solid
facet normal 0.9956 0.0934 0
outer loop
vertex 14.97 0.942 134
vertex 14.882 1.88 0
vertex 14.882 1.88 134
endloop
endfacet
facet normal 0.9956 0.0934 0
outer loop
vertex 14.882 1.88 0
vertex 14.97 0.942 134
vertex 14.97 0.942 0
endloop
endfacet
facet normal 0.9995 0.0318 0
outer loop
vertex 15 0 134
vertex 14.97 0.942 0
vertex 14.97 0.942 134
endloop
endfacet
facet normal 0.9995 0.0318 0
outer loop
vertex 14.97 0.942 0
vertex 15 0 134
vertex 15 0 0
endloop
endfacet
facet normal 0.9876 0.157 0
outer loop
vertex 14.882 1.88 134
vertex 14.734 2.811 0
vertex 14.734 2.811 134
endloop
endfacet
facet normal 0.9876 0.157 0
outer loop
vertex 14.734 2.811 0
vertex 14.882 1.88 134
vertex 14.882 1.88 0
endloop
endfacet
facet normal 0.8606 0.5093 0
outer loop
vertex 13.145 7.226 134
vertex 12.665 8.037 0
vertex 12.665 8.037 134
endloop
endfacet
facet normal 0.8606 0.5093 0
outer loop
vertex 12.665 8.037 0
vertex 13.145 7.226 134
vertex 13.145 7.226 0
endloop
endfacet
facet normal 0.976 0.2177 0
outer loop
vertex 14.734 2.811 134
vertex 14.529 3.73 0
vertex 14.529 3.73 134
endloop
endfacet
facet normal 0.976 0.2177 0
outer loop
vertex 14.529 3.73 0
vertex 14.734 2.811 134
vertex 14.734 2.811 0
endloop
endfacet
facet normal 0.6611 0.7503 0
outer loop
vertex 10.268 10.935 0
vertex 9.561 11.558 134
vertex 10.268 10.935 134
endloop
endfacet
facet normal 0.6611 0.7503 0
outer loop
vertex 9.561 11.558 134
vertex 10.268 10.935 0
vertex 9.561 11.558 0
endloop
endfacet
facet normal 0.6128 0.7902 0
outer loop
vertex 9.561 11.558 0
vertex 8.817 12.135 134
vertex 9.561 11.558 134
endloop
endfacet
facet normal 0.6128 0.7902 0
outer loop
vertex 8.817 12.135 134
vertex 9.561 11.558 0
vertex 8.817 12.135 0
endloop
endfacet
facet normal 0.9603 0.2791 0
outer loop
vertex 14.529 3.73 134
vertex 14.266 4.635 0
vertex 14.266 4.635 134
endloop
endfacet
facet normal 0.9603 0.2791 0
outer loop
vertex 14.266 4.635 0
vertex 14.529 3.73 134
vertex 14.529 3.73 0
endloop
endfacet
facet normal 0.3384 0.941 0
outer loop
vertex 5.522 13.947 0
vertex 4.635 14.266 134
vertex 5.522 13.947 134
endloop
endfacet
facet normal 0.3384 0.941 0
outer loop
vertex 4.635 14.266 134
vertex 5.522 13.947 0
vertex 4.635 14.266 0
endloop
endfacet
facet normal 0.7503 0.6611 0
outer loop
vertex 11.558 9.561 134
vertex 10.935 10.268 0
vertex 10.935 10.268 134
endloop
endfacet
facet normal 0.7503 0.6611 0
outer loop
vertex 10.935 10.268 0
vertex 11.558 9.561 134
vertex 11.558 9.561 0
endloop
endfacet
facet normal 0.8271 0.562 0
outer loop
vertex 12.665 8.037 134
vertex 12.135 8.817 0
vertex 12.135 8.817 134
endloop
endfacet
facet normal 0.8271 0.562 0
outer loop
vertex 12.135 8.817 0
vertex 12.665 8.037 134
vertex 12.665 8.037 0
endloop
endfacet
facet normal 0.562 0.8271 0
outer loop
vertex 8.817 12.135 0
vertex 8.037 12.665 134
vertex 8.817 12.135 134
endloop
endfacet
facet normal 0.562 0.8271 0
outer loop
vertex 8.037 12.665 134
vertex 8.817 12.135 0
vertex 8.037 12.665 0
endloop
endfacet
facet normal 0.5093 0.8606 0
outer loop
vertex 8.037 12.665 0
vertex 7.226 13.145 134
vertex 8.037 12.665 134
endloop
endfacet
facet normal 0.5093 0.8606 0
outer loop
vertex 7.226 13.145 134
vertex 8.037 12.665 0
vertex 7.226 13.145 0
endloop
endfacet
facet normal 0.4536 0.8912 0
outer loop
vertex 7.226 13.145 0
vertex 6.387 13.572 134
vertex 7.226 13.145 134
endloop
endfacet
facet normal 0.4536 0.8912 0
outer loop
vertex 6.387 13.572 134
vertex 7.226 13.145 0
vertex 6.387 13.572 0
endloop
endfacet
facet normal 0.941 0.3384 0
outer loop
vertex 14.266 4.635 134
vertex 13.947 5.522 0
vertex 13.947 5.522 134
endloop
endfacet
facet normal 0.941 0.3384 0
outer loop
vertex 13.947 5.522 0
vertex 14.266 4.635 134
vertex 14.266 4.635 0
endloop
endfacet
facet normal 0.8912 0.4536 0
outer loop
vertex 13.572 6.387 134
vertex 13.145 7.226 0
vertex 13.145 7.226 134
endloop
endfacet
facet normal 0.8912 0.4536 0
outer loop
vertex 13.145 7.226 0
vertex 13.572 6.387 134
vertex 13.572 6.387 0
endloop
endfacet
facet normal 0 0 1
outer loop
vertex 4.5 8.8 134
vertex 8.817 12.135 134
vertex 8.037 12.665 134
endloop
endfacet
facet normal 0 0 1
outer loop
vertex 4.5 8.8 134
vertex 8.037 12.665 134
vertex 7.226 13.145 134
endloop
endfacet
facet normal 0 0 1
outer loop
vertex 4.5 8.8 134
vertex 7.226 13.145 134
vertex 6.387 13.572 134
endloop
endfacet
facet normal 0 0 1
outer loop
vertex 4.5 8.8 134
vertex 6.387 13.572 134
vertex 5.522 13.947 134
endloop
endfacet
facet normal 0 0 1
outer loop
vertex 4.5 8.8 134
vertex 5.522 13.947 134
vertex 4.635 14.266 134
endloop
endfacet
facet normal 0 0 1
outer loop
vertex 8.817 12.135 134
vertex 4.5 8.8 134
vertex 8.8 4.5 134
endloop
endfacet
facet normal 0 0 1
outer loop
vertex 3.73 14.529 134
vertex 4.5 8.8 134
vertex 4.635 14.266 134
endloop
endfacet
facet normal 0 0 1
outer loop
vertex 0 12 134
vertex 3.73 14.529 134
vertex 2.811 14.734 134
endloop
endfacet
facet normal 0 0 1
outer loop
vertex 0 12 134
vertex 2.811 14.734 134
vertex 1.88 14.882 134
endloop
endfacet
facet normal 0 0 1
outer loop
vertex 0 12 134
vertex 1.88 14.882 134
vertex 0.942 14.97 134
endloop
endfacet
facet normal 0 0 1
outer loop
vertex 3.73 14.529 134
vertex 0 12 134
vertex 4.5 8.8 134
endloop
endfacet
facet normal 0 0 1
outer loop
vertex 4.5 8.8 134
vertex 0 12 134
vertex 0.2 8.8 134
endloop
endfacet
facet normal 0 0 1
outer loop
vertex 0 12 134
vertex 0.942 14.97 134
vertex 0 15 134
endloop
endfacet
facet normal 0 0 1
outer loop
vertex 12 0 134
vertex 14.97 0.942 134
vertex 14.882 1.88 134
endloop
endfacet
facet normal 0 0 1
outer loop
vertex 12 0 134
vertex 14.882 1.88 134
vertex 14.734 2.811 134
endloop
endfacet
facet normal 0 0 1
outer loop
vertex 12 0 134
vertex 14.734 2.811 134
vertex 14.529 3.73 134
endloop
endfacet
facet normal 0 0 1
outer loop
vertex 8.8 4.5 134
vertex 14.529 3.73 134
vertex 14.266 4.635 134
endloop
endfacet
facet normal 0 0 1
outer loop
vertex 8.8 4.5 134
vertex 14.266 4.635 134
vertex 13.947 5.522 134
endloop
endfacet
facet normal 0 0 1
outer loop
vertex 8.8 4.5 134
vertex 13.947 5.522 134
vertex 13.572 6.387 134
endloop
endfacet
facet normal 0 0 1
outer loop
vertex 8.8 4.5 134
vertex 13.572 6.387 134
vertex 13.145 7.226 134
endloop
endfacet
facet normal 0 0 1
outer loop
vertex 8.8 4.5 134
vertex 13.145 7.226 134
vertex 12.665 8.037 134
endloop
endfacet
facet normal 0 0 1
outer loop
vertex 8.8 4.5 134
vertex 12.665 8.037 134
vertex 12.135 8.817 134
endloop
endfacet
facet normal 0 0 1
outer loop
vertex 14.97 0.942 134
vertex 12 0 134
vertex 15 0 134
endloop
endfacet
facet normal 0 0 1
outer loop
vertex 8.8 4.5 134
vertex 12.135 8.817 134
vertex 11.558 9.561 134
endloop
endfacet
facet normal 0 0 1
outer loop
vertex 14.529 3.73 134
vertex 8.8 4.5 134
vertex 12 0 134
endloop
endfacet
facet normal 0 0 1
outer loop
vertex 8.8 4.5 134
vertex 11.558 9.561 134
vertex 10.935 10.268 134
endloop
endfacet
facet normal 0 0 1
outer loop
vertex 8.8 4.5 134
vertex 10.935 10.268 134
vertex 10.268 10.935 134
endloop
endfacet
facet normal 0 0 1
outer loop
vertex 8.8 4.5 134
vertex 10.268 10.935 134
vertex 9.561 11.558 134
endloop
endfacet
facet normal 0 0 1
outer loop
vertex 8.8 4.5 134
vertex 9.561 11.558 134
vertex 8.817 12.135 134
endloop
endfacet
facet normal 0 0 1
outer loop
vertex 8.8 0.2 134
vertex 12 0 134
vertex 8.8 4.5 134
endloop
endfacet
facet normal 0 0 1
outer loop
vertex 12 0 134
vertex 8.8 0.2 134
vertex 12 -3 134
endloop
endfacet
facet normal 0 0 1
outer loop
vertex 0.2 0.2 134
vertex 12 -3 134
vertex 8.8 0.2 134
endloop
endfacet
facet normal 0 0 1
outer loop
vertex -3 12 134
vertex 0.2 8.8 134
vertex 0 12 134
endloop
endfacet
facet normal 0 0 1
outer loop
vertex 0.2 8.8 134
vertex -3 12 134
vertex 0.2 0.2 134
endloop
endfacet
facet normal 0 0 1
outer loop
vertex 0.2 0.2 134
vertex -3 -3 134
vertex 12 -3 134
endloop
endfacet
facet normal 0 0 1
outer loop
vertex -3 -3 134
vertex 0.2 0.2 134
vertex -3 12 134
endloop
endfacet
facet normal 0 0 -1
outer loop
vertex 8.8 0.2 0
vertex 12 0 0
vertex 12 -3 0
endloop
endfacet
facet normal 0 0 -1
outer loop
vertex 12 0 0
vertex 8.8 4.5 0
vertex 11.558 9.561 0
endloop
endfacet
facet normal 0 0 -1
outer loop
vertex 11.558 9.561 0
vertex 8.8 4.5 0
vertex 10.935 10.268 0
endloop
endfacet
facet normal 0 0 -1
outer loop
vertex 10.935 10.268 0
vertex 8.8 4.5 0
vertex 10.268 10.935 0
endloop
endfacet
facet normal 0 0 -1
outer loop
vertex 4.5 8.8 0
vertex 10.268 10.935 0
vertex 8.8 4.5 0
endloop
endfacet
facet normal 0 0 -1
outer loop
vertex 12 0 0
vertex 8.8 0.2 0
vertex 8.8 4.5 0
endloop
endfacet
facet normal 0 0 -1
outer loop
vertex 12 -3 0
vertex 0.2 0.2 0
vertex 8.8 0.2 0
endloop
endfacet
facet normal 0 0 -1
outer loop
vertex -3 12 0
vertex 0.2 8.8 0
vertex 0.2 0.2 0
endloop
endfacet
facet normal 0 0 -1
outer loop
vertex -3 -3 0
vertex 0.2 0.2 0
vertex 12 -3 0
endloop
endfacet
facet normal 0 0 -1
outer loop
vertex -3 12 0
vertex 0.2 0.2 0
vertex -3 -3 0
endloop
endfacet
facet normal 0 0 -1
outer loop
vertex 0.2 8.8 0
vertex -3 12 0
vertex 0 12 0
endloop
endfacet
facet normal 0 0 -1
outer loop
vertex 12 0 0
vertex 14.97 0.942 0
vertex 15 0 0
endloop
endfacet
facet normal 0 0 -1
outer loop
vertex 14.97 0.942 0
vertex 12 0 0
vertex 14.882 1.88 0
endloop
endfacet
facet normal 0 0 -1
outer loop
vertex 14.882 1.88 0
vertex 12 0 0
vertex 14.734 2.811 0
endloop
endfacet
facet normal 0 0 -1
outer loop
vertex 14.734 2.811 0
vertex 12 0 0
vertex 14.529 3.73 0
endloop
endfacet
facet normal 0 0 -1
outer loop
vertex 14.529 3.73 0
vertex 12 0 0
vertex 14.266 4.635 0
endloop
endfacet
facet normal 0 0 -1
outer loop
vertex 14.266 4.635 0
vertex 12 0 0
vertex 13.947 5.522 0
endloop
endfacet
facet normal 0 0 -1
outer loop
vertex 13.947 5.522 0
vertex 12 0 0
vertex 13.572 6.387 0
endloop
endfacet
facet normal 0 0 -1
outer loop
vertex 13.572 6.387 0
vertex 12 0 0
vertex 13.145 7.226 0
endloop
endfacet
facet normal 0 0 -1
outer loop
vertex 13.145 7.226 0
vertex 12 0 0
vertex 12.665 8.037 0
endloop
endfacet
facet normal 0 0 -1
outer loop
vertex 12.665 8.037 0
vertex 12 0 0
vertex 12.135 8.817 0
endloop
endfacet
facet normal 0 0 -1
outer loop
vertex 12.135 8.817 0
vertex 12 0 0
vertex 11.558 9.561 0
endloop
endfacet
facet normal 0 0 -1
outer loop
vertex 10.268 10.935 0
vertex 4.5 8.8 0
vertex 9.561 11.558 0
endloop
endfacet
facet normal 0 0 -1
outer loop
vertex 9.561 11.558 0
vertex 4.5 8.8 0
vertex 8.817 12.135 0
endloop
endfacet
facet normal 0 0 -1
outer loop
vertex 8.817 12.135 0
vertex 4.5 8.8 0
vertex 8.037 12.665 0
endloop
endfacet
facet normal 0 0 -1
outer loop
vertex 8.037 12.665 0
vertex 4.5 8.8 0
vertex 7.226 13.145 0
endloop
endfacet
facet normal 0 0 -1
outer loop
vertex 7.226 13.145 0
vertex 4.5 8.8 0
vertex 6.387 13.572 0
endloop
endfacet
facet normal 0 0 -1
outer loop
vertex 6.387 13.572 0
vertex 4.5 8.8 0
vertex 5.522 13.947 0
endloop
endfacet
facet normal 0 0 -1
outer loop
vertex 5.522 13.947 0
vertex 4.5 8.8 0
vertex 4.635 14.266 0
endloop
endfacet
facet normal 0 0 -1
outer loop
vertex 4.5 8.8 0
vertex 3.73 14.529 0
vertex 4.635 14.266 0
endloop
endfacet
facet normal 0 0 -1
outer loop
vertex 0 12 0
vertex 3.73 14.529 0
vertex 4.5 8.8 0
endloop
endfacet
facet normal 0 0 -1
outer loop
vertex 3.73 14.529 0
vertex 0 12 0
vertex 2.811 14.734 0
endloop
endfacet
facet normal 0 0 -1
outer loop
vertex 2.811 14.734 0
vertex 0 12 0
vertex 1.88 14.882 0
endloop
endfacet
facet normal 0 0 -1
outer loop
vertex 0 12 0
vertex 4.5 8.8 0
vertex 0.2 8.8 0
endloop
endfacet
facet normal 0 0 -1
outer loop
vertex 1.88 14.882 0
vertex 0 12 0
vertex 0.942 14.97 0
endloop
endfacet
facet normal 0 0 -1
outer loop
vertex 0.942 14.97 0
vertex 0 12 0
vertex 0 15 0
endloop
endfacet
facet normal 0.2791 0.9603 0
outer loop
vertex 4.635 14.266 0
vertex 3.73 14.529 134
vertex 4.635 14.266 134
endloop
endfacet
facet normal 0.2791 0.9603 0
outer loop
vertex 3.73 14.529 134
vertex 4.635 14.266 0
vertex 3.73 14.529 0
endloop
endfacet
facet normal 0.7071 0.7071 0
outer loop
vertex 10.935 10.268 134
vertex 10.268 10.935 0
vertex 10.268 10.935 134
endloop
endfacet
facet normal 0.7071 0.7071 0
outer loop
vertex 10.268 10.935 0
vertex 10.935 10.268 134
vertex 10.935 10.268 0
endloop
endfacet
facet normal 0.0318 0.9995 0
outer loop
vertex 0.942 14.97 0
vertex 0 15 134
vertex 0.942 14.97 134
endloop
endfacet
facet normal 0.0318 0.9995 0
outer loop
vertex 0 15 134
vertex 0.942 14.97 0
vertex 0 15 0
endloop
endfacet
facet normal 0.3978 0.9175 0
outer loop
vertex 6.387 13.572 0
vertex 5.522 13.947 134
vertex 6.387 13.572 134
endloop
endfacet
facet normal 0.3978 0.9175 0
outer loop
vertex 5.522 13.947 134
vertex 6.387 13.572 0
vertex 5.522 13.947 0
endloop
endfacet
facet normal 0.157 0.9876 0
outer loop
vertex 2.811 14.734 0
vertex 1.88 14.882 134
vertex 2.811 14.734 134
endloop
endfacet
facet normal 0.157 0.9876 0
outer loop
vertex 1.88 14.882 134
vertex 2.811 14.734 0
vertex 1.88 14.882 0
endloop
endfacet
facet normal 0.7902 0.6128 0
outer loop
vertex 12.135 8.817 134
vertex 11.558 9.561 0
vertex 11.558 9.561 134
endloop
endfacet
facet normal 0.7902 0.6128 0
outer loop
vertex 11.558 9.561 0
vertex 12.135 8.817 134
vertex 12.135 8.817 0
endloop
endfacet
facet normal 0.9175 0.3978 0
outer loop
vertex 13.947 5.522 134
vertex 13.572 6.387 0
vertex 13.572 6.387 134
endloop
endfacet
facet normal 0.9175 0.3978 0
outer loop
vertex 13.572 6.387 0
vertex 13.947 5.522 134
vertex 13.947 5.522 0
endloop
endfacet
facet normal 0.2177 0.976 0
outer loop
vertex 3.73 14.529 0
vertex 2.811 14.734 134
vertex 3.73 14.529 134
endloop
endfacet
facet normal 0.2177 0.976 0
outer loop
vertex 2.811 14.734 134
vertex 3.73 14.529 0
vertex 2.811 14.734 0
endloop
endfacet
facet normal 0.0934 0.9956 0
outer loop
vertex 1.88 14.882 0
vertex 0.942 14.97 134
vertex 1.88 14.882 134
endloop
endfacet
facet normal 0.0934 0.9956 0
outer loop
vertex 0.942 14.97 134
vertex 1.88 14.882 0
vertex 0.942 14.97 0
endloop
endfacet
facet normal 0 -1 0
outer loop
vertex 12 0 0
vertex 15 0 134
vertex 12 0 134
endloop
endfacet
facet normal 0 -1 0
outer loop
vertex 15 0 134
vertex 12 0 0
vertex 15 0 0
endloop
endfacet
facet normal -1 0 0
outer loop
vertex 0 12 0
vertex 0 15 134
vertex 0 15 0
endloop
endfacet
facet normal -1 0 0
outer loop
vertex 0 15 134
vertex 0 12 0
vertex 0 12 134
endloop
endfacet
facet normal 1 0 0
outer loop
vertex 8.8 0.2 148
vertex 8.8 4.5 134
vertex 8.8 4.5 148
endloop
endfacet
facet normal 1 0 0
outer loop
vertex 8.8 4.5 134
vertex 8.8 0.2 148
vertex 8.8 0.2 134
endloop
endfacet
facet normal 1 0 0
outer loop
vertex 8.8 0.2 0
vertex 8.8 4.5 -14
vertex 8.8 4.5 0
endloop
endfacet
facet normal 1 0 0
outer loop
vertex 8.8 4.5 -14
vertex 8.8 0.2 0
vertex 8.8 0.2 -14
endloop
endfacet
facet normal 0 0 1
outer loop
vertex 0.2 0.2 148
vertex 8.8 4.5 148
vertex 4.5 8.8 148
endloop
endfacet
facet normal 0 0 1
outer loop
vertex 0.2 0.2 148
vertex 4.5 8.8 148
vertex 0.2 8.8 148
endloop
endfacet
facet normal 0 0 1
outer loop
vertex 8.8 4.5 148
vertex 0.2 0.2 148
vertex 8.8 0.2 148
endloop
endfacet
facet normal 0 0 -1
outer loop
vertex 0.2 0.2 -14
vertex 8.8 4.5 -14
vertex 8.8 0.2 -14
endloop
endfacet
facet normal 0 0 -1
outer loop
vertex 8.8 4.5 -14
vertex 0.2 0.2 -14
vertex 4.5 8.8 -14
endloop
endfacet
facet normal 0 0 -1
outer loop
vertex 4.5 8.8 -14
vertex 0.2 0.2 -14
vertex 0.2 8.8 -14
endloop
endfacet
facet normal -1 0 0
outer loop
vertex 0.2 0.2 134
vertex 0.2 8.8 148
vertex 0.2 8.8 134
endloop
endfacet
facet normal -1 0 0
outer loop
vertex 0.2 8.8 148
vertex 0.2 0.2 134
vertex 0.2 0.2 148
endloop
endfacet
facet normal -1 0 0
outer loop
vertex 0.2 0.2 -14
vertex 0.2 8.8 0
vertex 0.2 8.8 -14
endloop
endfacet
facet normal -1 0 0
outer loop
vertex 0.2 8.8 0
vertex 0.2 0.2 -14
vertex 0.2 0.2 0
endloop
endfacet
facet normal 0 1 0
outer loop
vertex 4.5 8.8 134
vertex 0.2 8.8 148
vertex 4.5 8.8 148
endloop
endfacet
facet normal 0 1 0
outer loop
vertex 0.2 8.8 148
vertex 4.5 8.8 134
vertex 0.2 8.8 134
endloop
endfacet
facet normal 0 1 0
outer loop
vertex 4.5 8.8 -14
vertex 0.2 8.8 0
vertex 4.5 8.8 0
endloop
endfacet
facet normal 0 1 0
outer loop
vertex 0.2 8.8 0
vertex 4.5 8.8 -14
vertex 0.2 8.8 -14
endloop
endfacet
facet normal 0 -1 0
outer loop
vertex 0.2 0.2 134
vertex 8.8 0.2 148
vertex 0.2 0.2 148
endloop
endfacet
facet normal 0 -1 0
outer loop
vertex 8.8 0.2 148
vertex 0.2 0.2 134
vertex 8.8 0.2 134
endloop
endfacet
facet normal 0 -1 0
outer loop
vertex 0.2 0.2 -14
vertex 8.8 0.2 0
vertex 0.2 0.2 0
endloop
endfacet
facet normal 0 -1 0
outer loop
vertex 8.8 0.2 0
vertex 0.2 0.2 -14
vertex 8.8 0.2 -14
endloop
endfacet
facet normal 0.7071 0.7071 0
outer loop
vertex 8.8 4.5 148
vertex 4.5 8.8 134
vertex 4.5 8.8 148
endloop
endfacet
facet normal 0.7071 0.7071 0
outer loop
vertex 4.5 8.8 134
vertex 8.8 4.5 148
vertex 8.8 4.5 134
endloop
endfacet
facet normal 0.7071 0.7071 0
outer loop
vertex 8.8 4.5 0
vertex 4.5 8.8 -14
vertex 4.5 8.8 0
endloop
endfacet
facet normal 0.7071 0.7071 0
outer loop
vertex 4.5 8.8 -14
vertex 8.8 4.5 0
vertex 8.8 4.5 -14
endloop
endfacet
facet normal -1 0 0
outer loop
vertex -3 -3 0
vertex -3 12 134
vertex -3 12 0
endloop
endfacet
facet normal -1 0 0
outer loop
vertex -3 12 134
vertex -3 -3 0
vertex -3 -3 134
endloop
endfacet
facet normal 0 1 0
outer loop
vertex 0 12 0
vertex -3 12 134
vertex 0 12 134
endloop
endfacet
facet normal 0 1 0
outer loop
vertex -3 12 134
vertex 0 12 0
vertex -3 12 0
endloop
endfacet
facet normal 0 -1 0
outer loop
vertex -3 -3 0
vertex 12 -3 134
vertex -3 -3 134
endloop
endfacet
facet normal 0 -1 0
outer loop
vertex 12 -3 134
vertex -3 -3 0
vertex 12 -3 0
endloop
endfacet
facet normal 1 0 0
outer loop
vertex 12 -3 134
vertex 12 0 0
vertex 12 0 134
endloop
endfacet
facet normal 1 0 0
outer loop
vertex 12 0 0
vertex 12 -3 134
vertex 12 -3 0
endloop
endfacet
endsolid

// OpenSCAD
// file: lib/frame_connector.scad
module frame_connector(radius, length, wall_thickness) {
    connector_size = radius - 2*wall_thickness;
    difference() {
        cube([connector_size, connector_size, length]);

        translate([connector_size, connector_size/2, -1])
        rotate([0, 0, 45])
        cube([connector_size, connector_size, length+2]);
    }
}
// file: parameter.scad
$fn = 100;

corner_radius = 15;
edge_long_length = 134;
edge_short_length = 90;
wall_thickness = 3;
wall_bearing_surface = 3;

ruthex_m3_thread_insert_radius = 2;
ruthex_m3_thread_insert_height = 6.7;
m3_screw_diameter = 3;
// main file
include <parameter.scad>;
use <lib/frame_connector.scad>

module frame_edge(radius, size, wall_thickness, wall_bearing_surface) {
    difference() {
        cylinder(r=radius, h=size);
        translate([-radius, -radius, -1]) cube([2*radius, radius, size+2]);
        translate([-radius, -1, -1]) cube([radius, 2*radius, size+2]);
    }
    translate([-wall_thickness, -wall_thickness, 0])
    cube([wall_bearing_surface, radius-wall_thickness+wall_bearing_surface, size]);

    translate([-wall_thickness, -wall_thickness, 0])
    cube([radius-wall_thickness+wall_bearing_surface, wall_bearing_surface, size]);

    translate([0.2, 0.2, -(radius-1)])
    frame_connector(
        radius = radius,
        length = size + 2*(radius-1),
        wall_thickness = wall_thickness + 0.2
    );
}

frame_edge(
    radius = corner_radius,
    size = edge_long_length,
    wall_thickness = wall_thickness,
    wall_bearing_surface = wall_bearing_surface
);
